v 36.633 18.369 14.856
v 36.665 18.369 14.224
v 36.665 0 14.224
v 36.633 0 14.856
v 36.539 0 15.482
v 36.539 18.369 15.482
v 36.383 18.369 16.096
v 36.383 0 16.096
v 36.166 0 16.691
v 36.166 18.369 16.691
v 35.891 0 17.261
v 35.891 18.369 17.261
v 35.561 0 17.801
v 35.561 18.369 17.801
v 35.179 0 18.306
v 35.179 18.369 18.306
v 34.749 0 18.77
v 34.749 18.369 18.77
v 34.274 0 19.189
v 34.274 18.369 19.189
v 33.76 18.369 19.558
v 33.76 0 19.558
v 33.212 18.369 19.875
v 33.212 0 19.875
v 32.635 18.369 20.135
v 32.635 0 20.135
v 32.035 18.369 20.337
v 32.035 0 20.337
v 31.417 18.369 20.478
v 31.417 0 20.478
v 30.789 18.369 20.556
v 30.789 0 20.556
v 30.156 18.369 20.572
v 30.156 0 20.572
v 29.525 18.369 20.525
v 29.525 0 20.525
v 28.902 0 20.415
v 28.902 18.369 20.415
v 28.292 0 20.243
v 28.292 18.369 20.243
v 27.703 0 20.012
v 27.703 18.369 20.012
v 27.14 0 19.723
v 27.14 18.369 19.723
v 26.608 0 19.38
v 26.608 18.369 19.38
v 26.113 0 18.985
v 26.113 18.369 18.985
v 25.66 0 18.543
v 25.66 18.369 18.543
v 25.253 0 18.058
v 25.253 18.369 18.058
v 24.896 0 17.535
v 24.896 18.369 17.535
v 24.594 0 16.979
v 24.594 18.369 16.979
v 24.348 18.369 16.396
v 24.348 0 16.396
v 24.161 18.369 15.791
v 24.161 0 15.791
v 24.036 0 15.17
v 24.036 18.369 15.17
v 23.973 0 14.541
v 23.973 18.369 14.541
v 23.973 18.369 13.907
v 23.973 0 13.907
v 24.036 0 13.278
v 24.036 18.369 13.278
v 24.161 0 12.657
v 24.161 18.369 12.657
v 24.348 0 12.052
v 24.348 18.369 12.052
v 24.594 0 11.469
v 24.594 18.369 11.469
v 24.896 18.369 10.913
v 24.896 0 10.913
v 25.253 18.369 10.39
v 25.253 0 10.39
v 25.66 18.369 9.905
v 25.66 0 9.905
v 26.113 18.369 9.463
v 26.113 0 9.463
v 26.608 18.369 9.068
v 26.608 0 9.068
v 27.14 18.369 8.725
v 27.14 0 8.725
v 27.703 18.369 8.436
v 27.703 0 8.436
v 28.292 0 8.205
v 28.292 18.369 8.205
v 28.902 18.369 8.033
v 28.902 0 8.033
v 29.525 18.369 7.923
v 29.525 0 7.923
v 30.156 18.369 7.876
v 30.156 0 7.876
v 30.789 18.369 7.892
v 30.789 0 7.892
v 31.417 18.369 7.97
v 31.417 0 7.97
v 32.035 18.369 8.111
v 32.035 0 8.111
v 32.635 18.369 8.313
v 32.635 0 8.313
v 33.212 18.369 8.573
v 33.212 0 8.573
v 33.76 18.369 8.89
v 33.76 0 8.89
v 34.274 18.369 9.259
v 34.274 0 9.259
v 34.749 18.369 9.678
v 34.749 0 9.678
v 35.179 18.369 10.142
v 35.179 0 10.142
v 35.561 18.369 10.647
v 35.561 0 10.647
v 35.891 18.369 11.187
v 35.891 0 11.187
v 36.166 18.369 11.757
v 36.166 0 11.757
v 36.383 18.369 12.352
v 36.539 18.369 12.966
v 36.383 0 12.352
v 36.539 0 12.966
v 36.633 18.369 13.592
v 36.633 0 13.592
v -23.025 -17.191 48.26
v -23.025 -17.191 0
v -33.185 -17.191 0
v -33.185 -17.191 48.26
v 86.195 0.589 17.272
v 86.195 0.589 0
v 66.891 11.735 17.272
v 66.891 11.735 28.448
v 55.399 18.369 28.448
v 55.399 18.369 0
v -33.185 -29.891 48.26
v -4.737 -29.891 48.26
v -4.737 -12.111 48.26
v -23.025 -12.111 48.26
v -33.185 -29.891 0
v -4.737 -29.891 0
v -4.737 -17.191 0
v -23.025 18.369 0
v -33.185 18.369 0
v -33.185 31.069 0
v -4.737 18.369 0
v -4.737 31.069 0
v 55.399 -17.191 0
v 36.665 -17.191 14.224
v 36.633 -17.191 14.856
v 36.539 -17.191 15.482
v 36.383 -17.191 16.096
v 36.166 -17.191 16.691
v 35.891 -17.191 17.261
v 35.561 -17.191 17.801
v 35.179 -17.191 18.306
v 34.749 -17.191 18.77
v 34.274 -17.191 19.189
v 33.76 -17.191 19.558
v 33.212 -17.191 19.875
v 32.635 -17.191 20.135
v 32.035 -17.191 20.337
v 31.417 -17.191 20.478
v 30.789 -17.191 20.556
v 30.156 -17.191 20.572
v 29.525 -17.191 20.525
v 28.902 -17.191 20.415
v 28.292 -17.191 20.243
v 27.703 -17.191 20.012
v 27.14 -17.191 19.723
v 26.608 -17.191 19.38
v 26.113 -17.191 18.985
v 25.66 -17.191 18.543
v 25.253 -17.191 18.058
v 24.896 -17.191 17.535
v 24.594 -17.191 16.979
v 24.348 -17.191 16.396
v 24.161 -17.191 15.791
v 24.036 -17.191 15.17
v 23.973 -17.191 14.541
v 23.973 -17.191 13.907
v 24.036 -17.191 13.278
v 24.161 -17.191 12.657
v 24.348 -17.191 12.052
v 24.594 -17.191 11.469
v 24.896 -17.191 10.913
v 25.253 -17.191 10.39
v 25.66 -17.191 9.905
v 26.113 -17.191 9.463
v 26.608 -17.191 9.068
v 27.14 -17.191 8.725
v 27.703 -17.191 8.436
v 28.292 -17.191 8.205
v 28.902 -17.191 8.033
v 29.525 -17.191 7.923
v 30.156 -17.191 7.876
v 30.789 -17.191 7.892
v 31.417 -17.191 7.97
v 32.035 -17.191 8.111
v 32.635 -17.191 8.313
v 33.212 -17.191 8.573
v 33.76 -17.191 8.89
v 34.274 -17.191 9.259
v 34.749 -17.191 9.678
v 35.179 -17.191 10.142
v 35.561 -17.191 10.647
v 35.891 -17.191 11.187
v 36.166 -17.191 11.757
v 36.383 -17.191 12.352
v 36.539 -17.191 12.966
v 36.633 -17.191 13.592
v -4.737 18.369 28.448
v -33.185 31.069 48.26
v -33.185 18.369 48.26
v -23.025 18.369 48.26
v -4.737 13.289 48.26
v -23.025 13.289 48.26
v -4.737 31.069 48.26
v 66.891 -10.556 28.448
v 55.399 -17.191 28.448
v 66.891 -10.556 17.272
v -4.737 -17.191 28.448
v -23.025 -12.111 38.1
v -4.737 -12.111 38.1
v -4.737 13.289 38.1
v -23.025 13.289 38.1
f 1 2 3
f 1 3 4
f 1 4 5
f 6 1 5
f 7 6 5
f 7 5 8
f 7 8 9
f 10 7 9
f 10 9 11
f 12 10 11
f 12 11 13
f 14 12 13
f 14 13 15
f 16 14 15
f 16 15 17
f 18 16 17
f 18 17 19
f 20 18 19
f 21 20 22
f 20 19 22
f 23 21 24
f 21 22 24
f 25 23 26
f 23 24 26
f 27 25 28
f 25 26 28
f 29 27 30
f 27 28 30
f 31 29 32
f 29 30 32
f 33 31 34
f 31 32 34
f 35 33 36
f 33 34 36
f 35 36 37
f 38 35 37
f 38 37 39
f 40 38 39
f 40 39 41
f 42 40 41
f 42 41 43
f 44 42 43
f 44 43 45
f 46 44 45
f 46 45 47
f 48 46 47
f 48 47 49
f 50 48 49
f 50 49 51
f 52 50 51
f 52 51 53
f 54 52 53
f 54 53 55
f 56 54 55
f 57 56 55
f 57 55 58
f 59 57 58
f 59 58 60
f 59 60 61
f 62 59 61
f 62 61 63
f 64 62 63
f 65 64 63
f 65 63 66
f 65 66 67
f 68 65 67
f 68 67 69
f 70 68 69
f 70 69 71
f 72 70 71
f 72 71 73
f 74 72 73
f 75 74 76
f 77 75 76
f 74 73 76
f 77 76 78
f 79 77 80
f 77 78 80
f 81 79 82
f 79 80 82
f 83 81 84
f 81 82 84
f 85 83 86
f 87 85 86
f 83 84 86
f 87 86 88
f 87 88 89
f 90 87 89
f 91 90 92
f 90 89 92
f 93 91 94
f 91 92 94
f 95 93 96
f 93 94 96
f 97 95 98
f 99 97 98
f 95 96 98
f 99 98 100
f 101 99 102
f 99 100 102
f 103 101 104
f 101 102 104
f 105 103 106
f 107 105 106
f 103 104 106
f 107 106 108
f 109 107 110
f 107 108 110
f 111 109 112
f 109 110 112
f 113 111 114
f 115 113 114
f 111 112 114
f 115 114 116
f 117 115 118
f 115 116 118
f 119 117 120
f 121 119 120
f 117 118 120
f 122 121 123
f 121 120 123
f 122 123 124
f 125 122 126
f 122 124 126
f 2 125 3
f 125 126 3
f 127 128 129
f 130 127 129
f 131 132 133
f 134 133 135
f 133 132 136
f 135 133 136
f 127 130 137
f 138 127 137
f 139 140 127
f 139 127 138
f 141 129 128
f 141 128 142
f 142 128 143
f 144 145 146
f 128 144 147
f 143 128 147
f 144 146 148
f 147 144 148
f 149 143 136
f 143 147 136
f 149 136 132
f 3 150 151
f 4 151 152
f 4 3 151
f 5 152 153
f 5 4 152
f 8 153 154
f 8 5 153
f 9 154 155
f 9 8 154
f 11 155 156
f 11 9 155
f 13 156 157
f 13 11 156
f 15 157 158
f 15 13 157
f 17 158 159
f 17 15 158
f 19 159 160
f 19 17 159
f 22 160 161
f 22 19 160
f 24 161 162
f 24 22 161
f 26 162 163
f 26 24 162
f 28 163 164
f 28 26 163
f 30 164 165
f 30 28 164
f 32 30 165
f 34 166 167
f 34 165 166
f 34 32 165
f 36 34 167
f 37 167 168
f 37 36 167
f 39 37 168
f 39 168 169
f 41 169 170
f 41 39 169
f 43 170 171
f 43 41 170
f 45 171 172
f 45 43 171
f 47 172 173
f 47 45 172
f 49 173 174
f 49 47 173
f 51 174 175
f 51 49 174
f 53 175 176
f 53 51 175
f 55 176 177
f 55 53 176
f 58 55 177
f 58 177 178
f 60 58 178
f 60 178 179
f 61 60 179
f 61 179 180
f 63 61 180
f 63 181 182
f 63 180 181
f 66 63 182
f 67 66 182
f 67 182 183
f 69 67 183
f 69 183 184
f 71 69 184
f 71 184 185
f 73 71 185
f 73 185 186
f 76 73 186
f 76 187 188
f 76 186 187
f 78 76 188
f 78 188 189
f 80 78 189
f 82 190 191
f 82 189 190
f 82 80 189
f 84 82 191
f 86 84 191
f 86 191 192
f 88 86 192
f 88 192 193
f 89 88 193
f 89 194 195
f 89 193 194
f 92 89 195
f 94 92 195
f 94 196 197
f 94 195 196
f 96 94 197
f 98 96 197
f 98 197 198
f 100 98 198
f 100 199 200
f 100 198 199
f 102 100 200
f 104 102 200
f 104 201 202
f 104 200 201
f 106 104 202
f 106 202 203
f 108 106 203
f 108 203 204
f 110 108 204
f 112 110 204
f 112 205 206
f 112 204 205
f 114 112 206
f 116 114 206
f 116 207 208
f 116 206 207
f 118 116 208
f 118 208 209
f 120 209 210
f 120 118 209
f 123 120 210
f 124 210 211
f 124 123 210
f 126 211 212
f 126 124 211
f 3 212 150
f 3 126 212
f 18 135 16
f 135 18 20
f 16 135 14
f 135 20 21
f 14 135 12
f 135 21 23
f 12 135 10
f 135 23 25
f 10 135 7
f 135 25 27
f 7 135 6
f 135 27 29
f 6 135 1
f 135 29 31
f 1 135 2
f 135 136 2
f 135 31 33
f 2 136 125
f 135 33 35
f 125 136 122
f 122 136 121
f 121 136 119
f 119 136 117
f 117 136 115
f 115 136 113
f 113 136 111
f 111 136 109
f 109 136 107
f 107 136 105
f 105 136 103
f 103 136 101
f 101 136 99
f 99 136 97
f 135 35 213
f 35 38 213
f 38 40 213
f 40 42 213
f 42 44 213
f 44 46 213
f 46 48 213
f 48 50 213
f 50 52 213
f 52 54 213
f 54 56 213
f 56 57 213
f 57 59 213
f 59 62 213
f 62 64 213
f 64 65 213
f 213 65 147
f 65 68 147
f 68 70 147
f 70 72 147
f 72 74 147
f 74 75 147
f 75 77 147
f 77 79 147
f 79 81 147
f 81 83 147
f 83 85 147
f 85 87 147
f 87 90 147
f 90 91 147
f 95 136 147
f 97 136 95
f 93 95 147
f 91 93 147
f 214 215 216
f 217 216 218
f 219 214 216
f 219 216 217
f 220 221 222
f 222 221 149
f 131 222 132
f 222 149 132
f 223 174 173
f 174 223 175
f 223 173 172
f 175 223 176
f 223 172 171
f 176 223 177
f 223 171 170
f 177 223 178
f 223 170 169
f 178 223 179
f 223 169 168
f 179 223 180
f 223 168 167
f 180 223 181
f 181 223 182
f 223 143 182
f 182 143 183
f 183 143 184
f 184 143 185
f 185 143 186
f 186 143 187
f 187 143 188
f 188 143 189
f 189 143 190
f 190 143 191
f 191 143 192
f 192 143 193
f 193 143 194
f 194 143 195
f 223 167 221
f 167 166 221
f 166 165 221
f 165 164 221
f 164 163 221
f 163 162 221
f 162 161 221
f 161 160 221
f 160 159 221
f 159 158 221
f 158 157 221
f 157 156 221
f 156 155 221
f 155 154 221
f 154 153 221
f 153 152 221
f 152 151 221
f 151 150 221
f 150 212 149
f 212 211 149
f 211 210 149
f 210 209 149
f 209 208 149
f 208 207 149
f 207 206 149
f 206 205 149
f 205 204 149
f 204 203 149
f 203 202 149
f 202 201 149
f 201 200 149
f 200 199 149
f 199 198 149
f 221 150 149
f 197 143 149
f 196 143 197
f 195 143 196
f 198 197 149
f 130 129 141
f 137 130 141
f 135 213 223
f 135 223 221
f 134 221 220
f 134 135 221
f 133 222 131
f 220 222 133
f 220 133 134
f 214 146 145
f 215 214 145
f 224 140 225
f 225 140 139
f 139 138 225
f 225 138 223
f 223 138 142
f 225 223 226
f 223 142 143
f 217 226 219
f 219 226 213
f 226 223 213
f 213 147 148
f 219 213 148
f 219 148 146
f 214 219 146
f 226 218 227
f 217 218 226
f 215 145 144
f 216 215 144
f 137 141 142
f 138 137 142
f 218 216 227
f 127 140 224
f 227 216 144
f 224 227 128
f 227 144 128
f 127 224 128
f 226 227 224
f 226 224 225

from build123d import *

# Parameters (mm, degrees)
F1_DEPTH = 48.26
F2_W     = 18.288
F2_H     = 25.4
F3_DEPTH = 10.16
F5_DEPTH = 28.448
F6_R     = 6.35
F6_W     = 51.748991
F6_H     = 25.627352
F7_DEPTH = 38.1


with BuildPart() as f1:
    # F0 (on Top) → F1 (new body)
    with BuildSketch(Plane.XY):
        Polygon((-4.737257, 31.069481), (-33.185257, 31.069481), (-33.185257, 18.369481), (-23.025257, 18.369481), (-23.025257, -17.190519), (-33.185257, -17.190519), (-33.185257, -29.890519), (-4.737257, -29.890519), align=None)
    extrude(amount=F1_DEPTH)

    # F2 (on face) → F3 (cut)
    with BuildSketch(Plane.XY.offset(48.26)):
        with Locations((-13.881257, 0.589481)):
            Rectangle(F2_W, F2_H)
    extrude(amount=-F3_DEPTH, mode=Mode.SUBTRACT)

    # F4 (on Top) → F5 (join)
    with BuildSketch(Plane.XY):
        Polygon((-4.737257, 18.369481), (-4.737257, -17.190519), (55.39888, -17.190519), (86.194743, 0.589481), (55.39888, 18.369481), align=None)
    extrude(amount=F5_DEPTH)

    # F6 (on Front) → F7 (cut, symmetric)
    with BuildSketch(Plane.XZ):
        with Locations((30.314743, 14.224)):
            Circle(F6_R)
        with Locations((92.765238, 30.085676)):
            Rectangle(F6_W, F6_H)
    extrude(amount=F7_DEPTH, both=True, mode=Mode.SUBTRACT)


solid = f1.part
